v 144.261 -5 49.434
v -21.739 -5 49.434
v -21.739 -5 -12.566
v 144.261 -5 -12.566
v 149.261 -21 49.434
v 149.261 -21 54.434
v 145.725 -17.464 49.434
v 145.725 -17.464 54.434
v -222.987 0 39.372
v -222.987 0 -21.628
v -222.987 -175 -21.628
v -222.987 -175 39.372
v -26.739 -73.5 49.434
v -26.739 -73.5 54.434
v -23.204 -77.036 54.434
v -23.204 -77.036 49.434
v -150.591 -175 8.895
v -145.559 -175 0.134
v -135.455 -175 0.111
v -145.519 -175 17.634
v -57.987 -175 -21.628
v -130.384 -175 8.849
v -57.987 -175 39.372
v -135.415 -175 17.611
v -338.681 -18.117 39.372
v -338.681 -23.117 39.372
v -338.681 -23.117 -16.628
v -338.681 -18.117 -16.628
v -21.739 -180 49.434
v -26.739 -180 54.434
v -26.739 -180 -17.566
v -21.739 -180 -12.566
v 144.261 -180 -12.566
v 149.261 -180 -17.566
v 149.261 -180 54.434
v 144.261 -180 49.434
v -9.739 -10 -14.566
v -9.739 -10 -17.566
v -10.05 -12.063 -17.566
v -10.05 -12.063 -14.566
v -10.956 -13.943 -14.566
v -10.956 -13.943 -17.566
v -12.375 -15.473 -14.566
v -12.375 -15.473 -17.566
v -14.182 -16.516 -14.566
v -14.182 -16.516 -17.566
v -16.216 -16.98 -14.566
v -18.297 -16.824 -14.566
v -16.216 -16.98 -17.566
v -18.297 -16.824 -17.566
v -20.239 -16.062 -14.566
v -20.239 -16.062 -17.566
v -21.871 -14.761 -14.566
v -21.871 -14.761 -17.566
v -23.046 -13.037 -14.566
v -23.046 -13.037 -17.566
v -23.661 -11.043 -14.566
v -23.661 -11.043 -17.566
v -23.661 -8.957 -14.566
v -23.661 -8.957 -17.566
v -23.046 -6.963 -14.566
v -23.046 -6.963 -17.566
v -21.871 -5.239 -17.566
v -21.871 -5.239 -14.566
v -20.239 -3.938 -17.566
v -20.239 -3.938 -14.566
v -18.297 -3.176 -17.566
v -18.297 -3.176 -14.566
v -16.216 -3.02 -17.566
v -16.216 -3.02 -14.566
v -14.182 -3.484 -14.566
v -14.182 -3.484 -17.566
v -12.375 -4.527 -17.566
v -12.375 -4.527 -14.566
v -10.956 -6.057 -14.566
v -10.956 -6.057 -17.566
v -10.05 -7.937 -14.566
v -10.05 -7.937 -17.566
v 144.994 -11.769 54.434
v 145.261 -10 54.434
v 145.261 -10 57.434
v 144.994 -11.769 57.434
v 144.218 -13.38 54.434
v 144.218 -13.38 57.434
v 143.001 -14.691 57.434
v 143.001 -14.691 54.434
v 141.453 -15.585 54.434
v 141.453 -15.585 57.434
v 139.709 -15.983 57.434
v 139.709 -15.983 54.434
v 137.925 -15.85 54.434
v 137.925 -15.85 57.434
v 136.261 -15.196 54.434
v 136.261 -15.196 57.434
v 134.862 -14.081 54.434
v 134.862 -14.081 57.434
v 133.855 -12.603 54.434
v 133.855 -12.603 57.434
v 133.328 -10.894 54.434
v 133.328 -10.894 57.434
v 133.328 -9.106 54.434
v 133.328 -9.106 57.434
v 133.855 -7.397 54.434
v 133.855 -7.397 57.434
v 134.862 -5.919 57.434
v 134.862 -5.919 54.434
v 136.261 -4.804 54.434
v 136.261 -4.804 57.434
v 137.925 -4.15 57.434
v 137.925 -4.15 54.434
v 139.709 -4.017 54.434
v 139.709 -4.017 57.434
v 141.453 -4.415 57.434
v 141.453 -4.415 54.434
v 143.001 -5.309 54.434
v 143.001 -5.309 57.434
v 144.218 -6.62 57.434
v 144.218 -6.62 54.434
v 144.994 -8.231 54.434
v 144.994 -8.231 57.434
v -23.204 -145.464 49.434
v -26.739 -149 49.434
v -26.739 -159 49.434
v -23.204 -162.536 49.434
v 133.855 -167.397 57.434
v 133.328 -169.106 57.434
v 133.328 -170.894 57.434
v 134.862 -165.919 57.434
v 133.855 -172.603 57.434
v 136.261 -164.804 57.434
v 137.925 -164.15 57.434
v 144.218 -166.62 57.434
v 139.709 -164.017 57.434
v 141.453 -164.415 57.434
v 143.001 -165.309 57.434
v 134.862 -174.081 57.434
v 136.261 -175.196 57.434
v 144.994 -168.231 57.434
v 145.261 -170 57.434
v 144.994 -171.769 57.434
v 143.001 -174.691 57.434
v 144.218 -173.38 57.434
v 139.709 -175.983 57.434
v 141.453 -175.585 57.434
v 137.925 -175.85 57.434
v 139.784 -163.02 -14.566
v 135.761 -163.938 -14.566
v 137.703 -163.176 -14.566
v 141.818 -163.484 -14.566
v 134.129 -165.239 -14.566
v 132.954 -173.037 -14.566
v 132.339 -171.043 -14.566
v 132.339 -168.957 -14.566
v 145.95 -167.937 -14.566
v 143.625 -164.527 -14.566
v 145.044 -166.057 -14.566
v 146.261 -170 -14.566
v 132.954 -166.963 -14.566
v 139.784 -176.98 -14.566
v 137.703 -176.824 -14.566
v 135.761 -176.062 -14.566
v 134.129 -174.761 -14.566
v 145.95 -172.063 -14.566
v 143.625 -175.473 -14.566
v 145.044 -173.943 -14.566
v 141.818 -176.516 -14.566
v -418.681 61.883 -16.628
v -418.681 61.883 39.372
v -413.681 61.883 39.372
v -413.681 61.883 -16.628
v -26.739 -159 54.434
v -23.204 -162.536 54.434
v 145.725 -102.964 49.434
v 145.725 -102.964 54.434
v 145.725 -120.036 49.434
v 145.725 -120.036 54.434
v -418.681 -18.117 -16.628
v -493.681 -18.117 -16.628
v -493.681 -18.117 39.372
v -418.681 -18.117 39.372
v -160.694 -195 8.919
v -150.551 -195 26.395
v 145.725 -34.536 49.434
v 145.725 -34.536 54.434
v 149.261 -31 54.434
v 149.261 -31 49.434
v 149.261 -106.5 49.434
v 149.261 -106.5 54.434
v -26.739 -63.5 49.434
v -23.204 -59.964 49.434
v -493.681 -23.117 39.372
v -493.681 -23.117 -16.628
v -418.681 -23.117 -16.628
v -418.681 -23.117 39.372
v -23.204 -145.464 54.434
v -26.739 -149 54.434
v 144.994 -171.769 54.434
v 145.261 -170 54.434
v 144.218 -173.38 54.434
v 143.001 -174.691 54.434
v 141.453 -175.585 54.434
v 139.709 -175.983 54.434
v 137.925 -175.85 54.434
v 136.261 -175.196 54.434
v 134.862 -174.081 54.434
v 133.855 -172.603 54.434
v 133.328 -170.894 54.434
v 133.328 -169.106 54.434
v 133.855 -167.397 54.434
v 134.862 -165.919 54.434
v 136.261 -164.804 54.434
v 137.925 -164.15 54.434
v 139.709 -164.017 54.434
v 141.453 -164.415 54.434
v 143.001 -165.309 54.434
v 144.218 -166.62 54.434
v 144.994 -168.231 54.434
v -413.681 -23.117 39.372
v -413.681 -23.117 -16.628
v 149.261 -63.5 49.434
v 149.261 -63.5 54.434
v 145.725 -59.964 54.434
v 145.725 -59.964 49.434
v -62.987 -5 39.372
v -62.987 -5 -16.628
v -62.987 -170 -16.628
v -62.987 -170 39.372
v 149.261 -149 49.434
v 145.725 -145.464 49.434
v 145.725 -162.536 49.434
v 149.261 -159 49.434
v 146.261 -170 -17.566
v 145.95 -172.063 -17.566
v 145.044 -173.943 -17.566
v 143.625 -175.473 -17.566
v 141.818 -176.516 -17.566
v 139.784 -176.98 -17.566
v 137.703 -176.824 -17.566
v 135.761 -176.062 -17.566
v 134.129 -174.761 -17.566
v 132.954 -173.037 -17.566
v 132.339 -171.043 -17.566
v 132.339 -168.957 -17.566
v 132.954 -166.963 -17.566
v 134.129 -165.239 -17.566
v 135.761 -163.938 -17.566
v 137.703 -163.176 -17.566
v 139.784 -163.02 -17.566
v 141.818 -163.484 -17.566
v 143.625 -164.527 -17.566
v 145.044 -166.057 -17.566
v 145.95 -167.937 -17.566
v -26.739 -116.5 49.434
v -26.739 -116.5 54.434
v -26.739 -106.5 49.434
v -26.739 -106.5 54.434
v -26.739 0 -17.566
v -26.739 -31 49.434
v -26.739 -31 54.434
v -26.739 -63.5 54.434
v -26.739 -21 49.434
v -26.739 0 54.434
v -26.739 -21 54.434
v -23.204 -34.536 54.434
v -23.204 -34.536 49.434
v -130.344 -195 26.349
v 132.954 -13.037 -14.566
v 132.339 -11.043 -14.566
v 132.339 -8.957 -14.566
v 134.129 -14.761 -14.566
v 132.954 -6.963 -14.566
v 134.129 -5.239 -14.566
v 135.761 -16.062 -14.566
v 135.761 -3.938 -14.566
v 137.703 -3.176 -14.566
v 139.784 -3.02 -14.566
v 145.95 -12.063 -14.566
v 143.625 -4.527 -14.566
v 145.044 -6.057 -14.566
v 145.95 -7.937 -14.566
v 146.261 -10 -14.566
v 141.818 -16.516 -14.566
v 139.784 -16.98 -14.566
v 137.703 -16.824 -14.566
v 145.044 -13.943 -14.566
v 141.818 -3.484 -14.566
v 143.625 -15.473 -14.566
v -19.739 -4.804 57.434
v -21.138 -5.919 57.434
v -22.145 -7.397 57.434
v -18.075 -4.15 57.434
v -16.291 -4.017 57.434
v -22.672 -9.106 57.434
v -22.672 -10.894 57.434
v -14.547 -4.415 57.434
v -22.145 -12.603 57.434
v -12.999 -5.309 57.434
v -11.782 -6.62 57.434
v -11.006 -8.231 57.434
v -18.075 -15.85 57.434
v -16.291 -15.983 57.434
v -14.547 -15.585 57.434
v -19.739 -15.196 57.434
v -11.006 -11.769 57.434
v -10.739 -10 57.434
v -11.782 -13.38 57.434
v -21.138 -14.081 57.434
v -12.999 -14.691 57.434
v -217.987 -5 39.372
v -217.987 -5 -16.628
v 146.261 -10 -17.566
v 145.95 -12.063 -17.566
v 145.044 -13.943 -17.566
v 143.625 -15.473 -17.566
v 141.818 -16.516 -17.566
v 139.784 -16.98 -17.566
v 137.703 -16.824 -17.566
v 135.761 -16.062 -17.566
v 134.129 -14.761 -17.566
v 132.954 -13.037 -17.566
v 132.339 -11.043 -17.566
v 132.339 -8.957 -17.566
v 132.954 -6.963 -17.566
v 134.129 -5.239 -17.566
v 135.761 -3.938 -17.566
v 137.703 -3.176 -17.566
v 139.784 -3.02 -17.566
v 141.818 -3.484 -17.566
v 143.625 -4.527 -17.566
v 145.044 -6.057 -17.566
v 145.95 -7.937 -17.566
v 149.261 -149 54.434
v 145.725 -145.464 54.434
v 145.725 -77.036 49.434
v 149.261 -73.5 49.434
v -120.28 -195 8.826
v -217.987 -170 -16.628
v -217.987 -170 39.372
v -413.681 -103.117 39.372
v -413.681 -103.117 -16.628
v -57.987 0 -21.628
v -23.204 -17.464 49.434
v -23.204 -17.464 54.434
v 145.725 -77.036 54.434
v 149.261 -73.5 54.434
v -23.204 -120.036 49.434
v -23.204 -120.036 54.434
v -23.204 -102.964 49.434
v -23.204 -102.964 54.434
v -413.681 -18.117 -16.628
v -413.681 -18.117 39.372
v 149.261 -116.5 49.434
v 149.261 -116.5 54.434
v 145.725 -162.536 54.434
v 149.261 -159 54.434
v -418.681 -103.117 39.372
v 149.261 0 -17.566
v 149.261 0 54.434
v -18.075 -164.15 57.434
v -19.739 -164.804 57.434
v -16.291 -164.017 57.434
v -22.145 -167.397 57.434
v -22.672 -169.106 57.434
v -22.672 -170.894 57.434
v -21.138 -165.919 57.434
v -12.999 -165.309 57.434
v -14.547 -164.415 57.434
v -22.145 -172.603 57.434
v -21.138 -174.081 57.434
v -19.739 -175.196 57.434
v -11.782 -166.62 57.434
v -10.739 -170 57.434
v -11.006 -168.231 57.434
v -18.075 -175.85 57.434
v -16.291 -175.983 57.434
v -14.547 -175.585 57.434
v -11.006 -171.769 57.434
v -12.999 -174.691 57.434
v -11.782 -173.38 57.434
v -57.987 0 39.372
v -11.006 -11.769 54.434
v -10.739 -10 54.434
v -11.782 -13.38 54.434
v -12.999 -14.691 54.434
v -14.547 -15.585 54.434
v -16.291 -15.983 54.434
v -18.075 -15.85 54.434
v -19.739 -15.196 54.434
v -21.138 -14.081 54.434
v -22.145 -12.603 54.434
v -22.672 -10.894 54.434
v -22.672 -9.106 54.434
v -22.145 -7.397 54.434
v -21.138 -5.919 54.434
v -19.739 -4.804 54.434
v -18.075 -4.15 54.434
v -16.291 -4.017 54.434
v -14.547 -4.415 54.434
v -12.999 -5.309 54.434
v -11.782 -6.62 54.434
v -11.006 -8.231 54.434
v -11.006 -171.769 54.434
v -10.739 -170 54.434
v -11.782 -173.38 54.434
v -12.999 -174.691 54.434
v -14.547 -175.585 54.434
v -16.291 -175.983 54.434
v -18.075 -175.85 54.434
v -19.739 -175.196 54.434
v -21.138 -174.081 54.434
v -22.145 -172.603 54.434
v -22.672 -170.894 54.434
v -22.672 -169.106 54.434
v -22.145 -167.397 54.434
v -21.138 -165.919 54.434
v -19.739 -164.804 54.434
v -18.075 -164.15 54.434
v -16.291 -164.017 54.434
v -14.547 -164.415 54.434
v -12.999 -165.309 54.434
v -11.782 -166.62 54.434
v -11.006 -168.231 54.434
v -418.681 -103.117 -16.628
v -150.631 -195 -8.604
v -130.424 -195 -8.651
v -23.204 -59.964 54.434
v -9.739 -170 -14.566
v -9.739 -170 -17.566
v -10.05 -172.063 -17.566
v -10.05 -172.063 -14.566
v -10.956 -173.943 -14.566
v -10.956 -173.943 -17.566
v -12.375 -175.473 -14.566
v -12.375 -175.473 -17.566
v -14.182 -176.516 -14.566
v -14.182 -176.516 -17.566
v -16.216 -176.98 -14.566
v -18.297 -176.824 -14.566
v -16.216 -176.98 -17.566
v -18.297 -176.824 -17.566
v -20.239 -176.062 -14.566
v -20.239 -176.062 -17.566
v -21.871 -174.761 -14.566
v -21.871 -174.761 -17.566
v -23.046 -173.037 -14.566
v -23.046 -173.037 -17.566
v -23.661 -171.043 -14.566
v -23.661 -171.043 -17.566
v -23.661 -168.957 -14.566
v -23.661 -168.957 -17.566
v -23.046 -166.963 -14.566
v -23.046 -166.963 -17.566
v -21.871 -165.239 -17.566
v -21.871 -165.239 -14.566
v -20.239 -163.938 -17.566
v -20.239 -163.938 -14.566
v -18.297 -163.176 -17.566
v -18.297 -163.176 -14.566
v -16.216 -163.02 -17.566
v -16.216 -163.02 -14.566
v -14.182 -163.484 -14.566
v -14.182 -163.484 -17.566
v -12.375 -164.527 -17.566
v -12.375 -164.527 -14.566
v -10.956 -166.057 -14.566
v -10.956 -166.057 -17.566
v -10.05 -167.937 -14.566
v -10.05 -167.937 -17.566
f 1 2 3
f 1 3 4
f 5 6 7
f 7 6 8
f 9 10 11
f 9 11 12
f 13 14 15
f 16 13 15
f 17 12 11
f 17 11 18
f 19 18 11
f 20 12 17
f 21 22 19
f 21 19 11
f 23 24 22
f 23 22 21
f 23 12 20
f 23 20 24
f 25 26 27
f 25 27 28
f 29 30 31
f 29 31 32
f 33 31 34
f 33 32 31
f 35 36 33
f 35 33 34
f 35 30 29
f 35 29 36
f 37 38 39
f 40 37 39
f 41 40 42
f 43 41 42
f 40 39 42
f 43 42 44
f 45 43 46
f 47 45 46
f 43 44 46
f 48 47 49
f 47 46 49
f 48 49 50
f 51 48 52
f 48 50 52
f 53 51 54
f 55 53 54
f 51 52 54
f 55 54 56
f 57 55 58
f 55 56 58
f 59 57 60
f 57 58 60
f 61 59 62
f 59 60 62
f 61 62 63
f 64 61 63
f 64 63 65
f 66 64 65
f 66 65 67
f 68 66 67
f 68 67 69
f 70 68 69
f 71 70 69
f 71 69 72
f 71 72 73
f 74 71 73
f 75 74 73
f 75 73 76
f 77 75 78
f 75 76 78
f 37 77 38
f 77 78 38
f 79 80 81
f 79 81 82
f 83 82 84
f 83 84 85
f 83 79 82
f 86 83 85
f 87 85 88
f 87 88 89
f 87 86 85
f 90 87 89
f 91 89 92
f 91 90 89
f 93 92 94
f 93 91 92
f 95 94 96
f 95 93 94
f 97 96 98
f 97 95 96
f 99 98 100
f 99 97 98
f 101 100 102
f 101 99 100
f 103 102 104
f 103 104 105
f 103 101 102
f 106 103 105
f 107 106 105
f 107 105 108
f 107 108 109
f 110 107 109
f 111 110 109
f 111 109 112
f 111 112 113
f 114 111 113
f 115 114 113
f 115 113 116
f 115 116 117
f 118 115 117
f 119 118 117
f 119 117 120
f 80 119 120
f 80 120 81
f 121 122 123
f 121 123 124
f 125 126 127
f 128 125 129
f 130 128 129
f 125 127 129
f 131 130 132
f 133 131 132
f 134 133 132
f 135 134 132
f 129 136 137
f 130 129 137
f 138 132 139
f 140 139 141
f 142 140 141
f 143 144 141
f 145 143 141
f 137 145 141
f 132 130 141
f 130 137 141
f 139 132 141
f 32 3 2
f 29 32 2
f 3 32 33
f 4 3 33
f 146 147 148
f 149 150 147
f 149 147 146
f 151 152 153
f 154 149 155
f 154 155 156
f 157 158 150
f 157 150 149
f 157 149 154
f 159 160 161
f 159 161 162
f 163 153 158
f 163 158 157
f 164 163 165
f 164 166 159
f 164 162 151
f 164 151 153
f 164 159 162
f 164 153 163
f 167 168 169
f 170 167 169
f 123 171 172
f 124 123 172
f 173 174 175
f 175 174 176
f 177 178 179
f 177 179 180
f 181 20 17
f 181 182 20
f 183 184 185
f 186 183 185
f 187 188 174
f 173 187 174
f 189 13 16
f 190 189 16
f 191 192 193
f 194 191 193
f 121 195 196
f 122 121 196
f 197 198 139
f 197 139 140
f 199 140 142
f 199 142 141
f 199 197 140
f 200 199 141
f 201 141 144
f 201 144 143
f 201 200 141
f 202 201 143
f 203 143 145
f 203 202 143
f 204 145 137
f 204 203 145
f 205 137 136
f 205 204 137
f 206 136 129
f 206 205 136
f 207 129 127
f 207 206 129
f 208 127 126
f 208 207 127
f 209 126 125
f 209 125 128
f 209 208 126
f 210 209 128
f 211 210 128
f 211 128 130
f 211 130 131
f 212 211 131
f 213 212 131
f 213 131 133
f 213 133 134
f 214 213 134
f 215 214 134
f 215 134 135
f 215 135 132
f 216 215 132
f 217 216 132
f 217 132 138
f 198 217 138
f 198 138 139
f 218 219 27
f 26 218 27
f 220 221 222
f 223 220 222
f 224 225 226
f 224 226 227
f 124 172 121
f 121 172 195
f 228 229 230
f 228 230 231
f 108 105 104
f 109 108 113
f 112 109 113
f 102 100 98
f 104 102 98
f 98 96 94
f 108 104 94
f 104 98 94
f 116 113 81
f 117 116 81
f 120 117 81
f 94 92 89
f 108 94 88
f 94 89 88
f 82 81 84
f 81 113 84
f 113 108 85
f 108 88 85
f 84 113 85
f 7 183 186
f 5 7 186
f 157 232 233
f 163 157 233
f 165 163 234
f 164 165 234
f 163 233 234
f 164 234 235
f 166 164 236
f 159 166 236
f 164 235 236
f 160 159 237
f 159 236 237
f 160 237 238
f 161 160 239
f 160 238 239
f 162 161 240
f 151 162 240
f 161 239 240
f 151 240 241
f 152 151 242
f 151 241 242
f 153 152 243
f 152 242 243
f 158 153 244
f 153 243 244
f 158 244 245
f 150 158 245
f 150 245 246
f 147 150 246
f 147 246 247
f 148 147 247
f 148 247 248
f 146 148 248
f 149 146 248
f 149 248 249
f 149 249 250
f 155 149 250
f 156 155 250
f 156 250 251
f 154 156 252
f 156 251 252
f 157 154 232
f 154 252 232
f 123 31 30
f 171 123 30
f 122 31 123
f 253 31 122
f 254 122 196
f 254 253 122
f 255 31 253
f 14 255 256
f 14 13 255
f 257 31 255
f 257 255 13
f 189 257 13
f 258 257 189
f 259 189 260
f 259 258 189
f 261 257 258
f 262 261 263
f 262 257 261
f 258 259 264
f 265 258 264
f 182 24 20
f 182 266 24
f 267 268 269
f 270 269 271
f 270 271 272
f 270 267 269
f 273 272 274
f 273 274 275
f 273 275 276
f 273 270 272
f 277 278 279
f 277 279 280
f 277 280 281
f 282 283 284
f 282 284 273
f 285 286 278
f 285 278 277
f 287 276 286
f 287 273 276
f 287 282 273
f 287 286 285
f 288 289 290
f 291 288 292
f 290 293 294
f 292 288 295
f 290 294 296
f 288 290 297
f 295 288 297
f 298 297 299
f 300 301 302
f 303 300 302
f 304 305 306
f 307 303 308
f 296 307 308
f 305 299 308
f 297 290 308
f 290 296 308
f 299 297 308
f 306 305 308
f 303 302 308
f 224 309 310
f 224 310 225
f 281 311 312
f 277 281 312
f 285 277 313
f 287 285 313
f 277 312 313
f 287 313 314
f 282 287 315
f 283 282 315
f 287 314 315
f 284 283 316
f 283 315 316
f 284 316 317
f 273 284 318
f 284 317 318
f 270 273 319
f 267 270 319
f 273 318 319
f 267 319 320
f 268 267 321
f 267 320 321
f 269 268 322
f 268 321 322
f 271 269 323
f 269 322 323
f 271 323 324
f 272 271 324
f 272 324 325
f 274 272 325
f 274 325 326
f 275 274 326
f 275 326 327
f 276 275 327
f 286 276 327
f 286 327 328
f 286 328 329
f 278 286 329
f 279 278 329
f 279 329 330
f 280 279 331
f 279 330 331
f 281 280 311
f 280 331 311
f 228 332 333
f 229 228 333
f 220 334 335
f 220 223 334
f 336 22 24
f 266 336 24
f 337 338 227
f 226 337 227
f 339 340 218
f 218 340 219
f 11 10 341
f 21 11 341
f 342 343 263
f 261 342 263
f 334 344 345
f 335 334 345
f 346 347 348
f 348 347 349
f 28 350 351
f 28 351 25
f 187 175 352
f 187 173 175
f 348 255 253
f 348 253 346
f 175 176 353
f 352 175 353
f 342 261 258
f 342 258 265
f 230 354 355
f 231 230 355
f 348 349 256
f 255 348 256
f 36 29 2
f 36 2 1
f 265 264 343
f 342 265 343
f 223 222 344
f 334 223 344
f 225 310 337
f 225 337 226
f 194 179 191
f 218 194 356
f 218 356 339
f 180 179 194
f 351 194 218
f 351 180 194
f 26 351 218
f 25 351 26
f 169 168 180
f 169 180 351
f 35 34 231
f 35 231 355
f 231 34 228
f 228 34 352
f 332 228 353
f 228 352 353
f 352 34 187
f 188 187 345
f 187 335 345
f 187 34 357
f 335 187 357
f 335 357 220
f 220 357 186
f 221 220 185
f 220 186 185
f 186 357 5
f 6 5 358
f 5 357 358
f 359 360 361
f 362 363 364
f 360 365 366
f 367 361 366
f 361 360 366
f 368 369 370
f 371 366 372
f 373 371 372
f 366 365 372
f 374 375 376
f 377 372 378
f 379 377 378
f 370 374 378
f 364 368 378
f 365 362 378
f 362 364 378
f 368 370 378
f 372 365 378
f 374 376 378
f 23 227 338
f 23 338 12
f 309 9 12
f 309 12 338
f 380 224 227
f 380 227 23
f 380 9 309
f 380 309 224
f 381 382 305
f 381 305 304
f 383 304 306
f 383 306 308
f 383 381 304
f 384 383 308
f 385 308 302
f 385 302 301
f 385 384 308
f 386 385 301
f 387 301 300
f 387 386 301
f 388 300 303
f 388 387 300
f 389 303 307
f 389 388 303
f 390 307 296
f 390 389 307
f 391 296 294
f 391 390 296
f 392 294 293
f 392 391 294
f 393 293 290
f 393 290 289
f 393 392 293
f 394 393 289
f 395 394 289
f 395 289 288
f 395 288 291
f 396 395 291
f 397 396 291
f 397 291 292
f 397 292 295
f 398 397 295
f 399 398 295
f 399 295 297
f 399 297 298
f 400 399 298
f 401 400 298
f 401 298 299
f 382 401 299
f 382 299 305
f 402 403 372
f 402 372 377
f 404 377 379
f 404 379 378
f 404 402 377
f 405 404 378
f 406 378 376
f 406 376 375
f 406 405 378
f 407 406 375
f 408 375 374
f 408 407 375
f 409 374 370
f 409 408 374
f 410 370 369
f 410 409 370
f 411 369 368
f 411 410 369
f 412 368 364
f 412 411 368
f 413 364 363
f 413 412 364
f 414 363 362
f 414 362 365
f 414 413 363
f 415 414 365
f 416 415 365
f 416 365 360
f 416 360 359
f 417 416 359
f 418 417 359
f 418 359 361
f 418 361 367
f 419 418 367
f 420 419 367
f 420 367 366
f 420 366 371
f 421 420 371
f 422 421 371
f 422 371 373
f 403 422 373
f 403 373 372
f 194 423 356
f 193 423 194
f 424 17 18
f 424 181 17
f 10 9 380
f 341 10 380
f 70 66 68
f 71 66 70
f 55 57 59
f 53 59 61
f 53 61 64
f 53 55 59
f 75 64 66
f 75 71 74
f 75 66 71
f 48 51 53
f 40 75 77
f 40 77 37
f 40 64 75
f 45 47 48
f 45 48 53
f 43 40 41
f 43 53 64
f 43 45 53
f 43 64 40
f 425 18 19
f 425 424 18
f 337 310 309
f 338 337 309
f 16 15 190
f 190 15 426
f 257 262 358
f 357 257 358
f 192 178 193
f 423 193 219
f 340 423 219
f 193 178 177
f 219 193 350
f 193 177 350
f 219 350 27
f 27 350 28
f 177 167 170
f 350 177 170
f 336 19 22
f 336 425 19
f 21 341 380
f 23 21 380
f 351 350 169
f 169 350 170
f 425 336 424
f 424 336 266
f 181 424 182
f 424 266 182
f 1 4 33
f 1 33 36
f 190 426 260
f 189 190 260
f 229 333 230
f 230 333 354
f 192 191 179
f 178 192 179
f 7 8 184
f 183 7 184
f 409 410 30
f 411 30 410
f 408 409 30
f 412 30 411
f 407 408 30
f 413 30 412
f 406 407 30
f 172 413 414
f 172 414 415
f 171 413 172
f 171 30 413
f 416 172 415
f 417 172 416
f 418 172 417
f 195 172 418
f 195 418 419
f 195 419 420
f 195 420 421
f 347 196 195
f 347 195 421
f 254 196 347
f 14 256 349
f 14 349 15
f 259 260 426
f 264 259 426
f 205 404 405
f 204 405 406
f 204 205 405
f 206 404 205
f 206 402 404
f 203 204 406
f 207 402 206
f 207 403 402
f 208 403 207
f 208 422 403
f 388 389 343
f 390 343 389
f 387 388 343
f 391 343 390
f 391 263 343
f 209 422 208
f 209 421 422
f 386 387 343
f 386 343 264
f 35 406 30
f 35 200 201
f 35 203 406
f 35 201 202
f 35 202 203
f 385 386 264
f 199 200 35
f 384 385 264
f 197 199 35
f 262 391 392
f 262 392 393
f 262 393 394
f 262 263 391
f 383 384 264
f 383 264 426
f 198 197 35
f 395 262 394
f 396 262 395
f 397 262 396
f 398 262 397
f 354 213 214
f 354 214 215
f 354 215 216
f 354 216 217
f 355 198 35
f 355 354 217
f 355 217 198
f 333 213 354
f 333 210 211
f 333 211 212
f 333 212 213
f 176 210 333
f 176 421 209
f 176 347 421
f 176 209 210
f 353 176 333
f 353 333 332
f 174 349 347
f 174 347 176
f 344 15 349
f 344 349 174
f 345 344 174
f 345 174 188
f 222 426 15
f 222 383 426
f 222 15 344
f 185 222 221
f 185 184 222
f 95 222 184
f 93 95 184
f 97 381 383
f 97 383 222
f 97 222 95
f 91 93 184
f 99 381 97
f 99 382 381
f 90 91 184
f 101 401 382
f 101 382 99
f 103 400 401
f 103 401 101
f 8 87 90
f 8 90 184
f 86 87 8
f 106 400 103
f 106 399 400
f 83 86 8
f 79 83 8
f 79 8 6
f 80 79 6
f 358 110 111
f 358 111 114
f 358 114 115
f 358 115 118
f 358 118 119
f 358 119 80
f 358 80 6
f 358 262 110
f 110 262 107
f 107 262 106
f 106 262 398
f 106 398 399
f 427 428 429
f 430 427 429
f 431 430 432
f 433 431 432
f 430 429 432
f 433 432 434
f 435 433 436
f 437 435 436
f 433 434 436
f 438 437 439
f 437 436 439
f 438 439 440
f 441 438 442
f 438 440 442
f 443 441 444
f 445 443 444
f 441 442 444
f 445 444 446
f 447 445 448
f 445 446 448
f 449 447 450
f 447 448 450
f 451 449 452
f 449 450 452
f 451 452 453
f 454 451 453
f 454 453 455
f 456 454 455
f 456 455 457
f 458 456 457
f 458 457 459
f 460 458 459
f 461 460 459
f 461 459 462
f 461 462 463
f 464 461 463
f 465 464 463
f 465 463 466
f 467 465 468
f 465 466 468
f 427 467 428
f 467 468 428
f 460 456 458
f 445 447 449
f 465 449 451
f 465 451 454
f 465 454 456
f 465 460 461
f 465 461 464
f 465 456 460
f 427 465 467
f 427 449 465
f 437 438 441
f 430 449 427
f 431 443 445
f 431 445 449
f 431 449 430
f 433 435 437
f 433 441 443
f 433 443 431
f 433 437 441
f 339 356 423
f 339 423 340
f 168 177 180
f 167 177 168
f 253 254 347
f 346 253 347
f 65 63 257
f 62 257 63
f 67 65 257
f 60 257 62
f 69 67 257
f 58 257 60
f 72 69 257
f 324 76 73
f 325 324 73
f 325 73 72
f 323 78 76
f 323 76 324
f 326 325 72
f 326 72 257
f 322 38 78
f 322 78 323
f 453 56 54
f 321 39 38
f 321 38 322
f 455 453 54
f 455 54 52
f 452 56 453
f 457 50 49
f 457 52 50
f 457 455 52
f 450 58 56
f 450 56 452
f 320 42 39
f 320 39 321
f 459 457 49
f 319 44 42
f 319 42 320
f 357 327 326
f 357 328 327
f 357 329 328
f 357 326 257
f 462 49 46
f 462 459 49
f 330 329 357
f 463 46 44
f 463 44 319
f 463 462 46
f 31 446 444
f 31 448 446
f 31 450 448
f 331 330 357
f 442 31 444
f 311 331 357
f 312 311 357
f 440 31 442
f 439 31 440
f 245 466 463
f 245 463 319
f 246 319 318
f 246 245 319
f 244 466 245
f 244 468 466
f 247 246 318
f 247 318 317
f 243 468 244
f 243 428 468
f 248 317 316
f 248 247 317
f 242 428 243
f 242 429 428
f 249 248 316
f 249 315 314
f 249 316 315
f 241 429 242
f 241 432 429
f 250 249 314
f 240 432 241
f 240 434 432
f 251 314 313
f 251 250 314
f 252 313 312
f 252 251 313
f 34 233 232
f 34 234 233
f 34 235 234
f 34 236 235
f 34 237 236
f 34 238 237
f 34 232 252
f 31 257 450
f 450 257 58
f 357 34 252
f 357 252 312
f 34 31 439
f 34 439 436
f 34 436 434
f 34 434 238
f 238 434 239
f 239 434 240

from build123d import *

# Parameters (mm, degrees)
F0_W      = 166
F0_H      = 62
F1_DEPTH  = 5
F0_W_2    = 176
F0_H_2    = 72
F2_DEPTH  = 180
F3_W      = 165
F3_H      = 61
F4_DEPTH  = 175
F5_T      = -5
F10_R     = 6
F11_DEPTH = 75
F10_R_2   = 7
F12_DEPTH = 3
F13_DEPTH = 314
F14_DEPTH = 5
F15_W     = 5
F15_H     = 80
F15_W_2   = 75
F15_H_2   = 5
F16_DEPTH = 56
F18_DEPTH = 5
F19_DEPTH = 3
F19_TAPER = -3


with BuildPart() as f1:
    # F0 (on Front) → F1 (new body)
    with BuildSketch(Plane.XZ):
        with Locations((61.2605069876, 18.4339095503)):
            Rectangle(F0_W, F0_H)
    extrude(amount=F1_DEPTH)

    # F0 (on Front) → F2 (join)
    with BuildSketch(Plane.XZ):
        with Locations((61.2605069876, 18.4339095503)):
            Rectangle(F0_W_2, F0_H_2)
        with Locations((61.2605069876, 18.4339095503)):
            Rectangle(F0_W, F0_H, mode=Mode.SUBTRACT)
    extrude(amount=F2_DEPTH)

    # F10 (on face) → F11 (join)
    with BuildSketch(Plane(origin=(0, 0, -17.5660904497), x_dir=(1, 0, 0), z_dir=(0, 0, -1))):
        with Locations((-16.7394930124, 170)):
            Circle(F10_R)
        with Locations((139.2605069876, 170)):
            Circle(F10_R)
        with Locations((139.2605069876, 10)):
            Circle(F10_R)
        with Locations((-16.7394930124, 10)):
            Circle(F10_R)
    extrude(amount=-F11_DEPTH)

    # F10 (on face) → F12 (cut)
    with BuildSketch(Plane(origin=(0, 0, -17.5660904497), x_dir=(1, 0, 0), z_dir=(0, 0, -1))):
        with Locations((-16.7394930124, 170)):
            Circle(F10_R_2)
        with Locations((-16.7394930124, 170)):
            Circle(F10_R, mode=Mode.SUBTRACT)
        with Locations((139.2605069876, 170)):
            Circle(F10_R_2)
        with Locations((139.2605069876, 170)):
            Circle(F10_R, mode=Mode.SUBTRACT)
        with Locations((139.2605069876, 10)):
            Circle(F10_R_2)
        with Locations((139.2605069876, 10)):
            Circle(F10_R, mode=Mode.SUBTRACT)
        with Locations((-16.7394930124, 10)):
            Circle(F10_R_2)
        with Locations((-16.7394930124, 10)):
            Circle(F10_R, mode=Mode.SUBTRACT)
    extrude(amount=-F12_DEPTH, mode=Mode.SUBTRACT)

    # F0 (on Front) → F13 (cut)
    with BuildSketch(Plane.XZ):
        with Locations((61.2605069876, 18.4339095503)):
            Rectangle(F0_W, F0_H)
    extrude(amount=F13_DEPTH, mode=Mode.SUBTRACT)

    # F0 (on Front) → F14 (join)
    with BuildSketch(Plane.XZ):
        with Locations((61.2605069876, 18.4339095503)):
            Rectangle(F0_W, F0_H)
    extrude(amount=F14_DEPTH)

    # F17 (on face) → F18 (cut)
    with BuildSketch(Plane.XY.offset(54.4339095503)):
        Polygon((-23.2039591065, -17.4644660941), (-26.7394930124, -21), (-26.7394930124, -31), (-23.2039591065, -34.5355339059), align=None)
        Polygon((-26.7394930124, -63.5), (-26.7394930124, -73.5), (-23.2039591065, -77.0355339059), (-23.2039591065, -59.9644660941), align=None)
        Polygon((-26.7394930124, -106.5), (-26.7394930124, -116.5), (-23.2039591065, -120.0355339059), (-23.2039591065, -102.9644660941), align=None)
        Polygon((-26.7394930124, -149), (-26.7394930124, -159), (-23.2039591065, -162.5355339059), (-23.2039591065, -145.4644660941), align=None)
        Polygon((149.2605069876, -159), (149.2605069876, -149), (145.7249730816, -145.4644660941), (145.7249730816, -162.5355339059), align=None)
        Polygon((145.7249730816, -120.0355339059), (149.2605069876, -116.5), (149.2605069876, -106.5), (145.7249730816, -102.9644660941), align=None)
        Polygon((145.7249730816, -77.0355339059), (149.2605069876, -73.5), (149.2605069876, -63.5), (145.7249730816, -59.9644660941), align=None)
        Polygon((145.7249730816, -34.5355339059), (149.2605069876, -31), (149.2605069876, -21), (145.7249730816, -17.4644660941), align=None)
    extrude(amount=-F18_DEPTH, mode=Mode.SUBTRACT)

    # F10 (on face) → F19 (cut)
    with BuildSketch(Plane(origin=(0, 0, -17.5660904497), x_dir=(1, 0, 0), z_dir=(0, 0, -1))):
        with Locations((-16.7394930124, 10)):
            Circle(F10_R)
        with Locations((139.2605069876, 10)):
            Circle(F10_R)
        with Locations((139.2605069876, 170)):
            Circle(F10_R)
        with Locations((-16.7394930124, 170)):
            Circle(F10_R)
    extrude(amount=-F19_DEPTH, taper=F19_TAPER, mode=Mode.SUBTRACT)


with BuildPart() as f4:
    # F3 (on Front) → F4 (new body)
    with BuildSketch(Plane.XZ):
        with Locations((-140.4871451855, 8.8723950386)):
            Rectangle(F3_W, F3_H)
    extrude(amount=F4_DEPTH)

    # F5
    f5_openings = [f4.faces().sort_by_distance(p)[0] for p in [
        (-140.487145, -87.5, 39.372395),
    ]]
    offset(amount=F5_T, openings=f5_openings)

    # F6 (on face) → F9 section 0
    with BuildSketch(Plane.XZ.offset(175)):
        Polygon((-130.3835418418, 8.8493124353), (-135.4153533928, 17.6108309024), (-145.5189567365, 17.6339135056), (-150.5907485292, 8.8954776419), (-145.5589369781, 0.1339591748), (-135.4553336344, 0.1108765716), align=None)
    # F8 (on offset) → F9 section 1
    with BuildSketch(Plane.XZ.offset(195)):
        Polygon((-120.2799384981, 8.8262298321), (-130.3435616002, 26.3492667662), (-150.5507682876, 26.3954319727), (-160.6943518729, 8.9185602451), (-150.6307287708, -8.6044766889), (-130.4235220834, -8.6506418955), align=None)
    loft()


with BuildPart() as f16:
    # F15 (on face) → F16 (new body)
    with BuildSketch(Plane.XY.offset(-16.6276049614)):
        with Locations((-416.180999279, 21.8830779195)):
            Rectangle(F15_W, F15_H)
        with Locations((-456.180999279, -20.6169220805)):
            Rectangle(F15_W_2, F15_H_2)
        with Locations((-416.180999279, -20.6169220805)):
            Rectangle(F15_W, F15_H_2)
        with Locations((-376.180999279, -20.6169220805)):
            Rectangle(F15_W_2, F15_H_2)
        with Locations((-416.180999279, -63.1169220805)):
            Rectangle(F15_W, F15_H)
    extrude(amount=F16_DEPTH)


solid = Compound([f1.part, f4.part, f16.part])
